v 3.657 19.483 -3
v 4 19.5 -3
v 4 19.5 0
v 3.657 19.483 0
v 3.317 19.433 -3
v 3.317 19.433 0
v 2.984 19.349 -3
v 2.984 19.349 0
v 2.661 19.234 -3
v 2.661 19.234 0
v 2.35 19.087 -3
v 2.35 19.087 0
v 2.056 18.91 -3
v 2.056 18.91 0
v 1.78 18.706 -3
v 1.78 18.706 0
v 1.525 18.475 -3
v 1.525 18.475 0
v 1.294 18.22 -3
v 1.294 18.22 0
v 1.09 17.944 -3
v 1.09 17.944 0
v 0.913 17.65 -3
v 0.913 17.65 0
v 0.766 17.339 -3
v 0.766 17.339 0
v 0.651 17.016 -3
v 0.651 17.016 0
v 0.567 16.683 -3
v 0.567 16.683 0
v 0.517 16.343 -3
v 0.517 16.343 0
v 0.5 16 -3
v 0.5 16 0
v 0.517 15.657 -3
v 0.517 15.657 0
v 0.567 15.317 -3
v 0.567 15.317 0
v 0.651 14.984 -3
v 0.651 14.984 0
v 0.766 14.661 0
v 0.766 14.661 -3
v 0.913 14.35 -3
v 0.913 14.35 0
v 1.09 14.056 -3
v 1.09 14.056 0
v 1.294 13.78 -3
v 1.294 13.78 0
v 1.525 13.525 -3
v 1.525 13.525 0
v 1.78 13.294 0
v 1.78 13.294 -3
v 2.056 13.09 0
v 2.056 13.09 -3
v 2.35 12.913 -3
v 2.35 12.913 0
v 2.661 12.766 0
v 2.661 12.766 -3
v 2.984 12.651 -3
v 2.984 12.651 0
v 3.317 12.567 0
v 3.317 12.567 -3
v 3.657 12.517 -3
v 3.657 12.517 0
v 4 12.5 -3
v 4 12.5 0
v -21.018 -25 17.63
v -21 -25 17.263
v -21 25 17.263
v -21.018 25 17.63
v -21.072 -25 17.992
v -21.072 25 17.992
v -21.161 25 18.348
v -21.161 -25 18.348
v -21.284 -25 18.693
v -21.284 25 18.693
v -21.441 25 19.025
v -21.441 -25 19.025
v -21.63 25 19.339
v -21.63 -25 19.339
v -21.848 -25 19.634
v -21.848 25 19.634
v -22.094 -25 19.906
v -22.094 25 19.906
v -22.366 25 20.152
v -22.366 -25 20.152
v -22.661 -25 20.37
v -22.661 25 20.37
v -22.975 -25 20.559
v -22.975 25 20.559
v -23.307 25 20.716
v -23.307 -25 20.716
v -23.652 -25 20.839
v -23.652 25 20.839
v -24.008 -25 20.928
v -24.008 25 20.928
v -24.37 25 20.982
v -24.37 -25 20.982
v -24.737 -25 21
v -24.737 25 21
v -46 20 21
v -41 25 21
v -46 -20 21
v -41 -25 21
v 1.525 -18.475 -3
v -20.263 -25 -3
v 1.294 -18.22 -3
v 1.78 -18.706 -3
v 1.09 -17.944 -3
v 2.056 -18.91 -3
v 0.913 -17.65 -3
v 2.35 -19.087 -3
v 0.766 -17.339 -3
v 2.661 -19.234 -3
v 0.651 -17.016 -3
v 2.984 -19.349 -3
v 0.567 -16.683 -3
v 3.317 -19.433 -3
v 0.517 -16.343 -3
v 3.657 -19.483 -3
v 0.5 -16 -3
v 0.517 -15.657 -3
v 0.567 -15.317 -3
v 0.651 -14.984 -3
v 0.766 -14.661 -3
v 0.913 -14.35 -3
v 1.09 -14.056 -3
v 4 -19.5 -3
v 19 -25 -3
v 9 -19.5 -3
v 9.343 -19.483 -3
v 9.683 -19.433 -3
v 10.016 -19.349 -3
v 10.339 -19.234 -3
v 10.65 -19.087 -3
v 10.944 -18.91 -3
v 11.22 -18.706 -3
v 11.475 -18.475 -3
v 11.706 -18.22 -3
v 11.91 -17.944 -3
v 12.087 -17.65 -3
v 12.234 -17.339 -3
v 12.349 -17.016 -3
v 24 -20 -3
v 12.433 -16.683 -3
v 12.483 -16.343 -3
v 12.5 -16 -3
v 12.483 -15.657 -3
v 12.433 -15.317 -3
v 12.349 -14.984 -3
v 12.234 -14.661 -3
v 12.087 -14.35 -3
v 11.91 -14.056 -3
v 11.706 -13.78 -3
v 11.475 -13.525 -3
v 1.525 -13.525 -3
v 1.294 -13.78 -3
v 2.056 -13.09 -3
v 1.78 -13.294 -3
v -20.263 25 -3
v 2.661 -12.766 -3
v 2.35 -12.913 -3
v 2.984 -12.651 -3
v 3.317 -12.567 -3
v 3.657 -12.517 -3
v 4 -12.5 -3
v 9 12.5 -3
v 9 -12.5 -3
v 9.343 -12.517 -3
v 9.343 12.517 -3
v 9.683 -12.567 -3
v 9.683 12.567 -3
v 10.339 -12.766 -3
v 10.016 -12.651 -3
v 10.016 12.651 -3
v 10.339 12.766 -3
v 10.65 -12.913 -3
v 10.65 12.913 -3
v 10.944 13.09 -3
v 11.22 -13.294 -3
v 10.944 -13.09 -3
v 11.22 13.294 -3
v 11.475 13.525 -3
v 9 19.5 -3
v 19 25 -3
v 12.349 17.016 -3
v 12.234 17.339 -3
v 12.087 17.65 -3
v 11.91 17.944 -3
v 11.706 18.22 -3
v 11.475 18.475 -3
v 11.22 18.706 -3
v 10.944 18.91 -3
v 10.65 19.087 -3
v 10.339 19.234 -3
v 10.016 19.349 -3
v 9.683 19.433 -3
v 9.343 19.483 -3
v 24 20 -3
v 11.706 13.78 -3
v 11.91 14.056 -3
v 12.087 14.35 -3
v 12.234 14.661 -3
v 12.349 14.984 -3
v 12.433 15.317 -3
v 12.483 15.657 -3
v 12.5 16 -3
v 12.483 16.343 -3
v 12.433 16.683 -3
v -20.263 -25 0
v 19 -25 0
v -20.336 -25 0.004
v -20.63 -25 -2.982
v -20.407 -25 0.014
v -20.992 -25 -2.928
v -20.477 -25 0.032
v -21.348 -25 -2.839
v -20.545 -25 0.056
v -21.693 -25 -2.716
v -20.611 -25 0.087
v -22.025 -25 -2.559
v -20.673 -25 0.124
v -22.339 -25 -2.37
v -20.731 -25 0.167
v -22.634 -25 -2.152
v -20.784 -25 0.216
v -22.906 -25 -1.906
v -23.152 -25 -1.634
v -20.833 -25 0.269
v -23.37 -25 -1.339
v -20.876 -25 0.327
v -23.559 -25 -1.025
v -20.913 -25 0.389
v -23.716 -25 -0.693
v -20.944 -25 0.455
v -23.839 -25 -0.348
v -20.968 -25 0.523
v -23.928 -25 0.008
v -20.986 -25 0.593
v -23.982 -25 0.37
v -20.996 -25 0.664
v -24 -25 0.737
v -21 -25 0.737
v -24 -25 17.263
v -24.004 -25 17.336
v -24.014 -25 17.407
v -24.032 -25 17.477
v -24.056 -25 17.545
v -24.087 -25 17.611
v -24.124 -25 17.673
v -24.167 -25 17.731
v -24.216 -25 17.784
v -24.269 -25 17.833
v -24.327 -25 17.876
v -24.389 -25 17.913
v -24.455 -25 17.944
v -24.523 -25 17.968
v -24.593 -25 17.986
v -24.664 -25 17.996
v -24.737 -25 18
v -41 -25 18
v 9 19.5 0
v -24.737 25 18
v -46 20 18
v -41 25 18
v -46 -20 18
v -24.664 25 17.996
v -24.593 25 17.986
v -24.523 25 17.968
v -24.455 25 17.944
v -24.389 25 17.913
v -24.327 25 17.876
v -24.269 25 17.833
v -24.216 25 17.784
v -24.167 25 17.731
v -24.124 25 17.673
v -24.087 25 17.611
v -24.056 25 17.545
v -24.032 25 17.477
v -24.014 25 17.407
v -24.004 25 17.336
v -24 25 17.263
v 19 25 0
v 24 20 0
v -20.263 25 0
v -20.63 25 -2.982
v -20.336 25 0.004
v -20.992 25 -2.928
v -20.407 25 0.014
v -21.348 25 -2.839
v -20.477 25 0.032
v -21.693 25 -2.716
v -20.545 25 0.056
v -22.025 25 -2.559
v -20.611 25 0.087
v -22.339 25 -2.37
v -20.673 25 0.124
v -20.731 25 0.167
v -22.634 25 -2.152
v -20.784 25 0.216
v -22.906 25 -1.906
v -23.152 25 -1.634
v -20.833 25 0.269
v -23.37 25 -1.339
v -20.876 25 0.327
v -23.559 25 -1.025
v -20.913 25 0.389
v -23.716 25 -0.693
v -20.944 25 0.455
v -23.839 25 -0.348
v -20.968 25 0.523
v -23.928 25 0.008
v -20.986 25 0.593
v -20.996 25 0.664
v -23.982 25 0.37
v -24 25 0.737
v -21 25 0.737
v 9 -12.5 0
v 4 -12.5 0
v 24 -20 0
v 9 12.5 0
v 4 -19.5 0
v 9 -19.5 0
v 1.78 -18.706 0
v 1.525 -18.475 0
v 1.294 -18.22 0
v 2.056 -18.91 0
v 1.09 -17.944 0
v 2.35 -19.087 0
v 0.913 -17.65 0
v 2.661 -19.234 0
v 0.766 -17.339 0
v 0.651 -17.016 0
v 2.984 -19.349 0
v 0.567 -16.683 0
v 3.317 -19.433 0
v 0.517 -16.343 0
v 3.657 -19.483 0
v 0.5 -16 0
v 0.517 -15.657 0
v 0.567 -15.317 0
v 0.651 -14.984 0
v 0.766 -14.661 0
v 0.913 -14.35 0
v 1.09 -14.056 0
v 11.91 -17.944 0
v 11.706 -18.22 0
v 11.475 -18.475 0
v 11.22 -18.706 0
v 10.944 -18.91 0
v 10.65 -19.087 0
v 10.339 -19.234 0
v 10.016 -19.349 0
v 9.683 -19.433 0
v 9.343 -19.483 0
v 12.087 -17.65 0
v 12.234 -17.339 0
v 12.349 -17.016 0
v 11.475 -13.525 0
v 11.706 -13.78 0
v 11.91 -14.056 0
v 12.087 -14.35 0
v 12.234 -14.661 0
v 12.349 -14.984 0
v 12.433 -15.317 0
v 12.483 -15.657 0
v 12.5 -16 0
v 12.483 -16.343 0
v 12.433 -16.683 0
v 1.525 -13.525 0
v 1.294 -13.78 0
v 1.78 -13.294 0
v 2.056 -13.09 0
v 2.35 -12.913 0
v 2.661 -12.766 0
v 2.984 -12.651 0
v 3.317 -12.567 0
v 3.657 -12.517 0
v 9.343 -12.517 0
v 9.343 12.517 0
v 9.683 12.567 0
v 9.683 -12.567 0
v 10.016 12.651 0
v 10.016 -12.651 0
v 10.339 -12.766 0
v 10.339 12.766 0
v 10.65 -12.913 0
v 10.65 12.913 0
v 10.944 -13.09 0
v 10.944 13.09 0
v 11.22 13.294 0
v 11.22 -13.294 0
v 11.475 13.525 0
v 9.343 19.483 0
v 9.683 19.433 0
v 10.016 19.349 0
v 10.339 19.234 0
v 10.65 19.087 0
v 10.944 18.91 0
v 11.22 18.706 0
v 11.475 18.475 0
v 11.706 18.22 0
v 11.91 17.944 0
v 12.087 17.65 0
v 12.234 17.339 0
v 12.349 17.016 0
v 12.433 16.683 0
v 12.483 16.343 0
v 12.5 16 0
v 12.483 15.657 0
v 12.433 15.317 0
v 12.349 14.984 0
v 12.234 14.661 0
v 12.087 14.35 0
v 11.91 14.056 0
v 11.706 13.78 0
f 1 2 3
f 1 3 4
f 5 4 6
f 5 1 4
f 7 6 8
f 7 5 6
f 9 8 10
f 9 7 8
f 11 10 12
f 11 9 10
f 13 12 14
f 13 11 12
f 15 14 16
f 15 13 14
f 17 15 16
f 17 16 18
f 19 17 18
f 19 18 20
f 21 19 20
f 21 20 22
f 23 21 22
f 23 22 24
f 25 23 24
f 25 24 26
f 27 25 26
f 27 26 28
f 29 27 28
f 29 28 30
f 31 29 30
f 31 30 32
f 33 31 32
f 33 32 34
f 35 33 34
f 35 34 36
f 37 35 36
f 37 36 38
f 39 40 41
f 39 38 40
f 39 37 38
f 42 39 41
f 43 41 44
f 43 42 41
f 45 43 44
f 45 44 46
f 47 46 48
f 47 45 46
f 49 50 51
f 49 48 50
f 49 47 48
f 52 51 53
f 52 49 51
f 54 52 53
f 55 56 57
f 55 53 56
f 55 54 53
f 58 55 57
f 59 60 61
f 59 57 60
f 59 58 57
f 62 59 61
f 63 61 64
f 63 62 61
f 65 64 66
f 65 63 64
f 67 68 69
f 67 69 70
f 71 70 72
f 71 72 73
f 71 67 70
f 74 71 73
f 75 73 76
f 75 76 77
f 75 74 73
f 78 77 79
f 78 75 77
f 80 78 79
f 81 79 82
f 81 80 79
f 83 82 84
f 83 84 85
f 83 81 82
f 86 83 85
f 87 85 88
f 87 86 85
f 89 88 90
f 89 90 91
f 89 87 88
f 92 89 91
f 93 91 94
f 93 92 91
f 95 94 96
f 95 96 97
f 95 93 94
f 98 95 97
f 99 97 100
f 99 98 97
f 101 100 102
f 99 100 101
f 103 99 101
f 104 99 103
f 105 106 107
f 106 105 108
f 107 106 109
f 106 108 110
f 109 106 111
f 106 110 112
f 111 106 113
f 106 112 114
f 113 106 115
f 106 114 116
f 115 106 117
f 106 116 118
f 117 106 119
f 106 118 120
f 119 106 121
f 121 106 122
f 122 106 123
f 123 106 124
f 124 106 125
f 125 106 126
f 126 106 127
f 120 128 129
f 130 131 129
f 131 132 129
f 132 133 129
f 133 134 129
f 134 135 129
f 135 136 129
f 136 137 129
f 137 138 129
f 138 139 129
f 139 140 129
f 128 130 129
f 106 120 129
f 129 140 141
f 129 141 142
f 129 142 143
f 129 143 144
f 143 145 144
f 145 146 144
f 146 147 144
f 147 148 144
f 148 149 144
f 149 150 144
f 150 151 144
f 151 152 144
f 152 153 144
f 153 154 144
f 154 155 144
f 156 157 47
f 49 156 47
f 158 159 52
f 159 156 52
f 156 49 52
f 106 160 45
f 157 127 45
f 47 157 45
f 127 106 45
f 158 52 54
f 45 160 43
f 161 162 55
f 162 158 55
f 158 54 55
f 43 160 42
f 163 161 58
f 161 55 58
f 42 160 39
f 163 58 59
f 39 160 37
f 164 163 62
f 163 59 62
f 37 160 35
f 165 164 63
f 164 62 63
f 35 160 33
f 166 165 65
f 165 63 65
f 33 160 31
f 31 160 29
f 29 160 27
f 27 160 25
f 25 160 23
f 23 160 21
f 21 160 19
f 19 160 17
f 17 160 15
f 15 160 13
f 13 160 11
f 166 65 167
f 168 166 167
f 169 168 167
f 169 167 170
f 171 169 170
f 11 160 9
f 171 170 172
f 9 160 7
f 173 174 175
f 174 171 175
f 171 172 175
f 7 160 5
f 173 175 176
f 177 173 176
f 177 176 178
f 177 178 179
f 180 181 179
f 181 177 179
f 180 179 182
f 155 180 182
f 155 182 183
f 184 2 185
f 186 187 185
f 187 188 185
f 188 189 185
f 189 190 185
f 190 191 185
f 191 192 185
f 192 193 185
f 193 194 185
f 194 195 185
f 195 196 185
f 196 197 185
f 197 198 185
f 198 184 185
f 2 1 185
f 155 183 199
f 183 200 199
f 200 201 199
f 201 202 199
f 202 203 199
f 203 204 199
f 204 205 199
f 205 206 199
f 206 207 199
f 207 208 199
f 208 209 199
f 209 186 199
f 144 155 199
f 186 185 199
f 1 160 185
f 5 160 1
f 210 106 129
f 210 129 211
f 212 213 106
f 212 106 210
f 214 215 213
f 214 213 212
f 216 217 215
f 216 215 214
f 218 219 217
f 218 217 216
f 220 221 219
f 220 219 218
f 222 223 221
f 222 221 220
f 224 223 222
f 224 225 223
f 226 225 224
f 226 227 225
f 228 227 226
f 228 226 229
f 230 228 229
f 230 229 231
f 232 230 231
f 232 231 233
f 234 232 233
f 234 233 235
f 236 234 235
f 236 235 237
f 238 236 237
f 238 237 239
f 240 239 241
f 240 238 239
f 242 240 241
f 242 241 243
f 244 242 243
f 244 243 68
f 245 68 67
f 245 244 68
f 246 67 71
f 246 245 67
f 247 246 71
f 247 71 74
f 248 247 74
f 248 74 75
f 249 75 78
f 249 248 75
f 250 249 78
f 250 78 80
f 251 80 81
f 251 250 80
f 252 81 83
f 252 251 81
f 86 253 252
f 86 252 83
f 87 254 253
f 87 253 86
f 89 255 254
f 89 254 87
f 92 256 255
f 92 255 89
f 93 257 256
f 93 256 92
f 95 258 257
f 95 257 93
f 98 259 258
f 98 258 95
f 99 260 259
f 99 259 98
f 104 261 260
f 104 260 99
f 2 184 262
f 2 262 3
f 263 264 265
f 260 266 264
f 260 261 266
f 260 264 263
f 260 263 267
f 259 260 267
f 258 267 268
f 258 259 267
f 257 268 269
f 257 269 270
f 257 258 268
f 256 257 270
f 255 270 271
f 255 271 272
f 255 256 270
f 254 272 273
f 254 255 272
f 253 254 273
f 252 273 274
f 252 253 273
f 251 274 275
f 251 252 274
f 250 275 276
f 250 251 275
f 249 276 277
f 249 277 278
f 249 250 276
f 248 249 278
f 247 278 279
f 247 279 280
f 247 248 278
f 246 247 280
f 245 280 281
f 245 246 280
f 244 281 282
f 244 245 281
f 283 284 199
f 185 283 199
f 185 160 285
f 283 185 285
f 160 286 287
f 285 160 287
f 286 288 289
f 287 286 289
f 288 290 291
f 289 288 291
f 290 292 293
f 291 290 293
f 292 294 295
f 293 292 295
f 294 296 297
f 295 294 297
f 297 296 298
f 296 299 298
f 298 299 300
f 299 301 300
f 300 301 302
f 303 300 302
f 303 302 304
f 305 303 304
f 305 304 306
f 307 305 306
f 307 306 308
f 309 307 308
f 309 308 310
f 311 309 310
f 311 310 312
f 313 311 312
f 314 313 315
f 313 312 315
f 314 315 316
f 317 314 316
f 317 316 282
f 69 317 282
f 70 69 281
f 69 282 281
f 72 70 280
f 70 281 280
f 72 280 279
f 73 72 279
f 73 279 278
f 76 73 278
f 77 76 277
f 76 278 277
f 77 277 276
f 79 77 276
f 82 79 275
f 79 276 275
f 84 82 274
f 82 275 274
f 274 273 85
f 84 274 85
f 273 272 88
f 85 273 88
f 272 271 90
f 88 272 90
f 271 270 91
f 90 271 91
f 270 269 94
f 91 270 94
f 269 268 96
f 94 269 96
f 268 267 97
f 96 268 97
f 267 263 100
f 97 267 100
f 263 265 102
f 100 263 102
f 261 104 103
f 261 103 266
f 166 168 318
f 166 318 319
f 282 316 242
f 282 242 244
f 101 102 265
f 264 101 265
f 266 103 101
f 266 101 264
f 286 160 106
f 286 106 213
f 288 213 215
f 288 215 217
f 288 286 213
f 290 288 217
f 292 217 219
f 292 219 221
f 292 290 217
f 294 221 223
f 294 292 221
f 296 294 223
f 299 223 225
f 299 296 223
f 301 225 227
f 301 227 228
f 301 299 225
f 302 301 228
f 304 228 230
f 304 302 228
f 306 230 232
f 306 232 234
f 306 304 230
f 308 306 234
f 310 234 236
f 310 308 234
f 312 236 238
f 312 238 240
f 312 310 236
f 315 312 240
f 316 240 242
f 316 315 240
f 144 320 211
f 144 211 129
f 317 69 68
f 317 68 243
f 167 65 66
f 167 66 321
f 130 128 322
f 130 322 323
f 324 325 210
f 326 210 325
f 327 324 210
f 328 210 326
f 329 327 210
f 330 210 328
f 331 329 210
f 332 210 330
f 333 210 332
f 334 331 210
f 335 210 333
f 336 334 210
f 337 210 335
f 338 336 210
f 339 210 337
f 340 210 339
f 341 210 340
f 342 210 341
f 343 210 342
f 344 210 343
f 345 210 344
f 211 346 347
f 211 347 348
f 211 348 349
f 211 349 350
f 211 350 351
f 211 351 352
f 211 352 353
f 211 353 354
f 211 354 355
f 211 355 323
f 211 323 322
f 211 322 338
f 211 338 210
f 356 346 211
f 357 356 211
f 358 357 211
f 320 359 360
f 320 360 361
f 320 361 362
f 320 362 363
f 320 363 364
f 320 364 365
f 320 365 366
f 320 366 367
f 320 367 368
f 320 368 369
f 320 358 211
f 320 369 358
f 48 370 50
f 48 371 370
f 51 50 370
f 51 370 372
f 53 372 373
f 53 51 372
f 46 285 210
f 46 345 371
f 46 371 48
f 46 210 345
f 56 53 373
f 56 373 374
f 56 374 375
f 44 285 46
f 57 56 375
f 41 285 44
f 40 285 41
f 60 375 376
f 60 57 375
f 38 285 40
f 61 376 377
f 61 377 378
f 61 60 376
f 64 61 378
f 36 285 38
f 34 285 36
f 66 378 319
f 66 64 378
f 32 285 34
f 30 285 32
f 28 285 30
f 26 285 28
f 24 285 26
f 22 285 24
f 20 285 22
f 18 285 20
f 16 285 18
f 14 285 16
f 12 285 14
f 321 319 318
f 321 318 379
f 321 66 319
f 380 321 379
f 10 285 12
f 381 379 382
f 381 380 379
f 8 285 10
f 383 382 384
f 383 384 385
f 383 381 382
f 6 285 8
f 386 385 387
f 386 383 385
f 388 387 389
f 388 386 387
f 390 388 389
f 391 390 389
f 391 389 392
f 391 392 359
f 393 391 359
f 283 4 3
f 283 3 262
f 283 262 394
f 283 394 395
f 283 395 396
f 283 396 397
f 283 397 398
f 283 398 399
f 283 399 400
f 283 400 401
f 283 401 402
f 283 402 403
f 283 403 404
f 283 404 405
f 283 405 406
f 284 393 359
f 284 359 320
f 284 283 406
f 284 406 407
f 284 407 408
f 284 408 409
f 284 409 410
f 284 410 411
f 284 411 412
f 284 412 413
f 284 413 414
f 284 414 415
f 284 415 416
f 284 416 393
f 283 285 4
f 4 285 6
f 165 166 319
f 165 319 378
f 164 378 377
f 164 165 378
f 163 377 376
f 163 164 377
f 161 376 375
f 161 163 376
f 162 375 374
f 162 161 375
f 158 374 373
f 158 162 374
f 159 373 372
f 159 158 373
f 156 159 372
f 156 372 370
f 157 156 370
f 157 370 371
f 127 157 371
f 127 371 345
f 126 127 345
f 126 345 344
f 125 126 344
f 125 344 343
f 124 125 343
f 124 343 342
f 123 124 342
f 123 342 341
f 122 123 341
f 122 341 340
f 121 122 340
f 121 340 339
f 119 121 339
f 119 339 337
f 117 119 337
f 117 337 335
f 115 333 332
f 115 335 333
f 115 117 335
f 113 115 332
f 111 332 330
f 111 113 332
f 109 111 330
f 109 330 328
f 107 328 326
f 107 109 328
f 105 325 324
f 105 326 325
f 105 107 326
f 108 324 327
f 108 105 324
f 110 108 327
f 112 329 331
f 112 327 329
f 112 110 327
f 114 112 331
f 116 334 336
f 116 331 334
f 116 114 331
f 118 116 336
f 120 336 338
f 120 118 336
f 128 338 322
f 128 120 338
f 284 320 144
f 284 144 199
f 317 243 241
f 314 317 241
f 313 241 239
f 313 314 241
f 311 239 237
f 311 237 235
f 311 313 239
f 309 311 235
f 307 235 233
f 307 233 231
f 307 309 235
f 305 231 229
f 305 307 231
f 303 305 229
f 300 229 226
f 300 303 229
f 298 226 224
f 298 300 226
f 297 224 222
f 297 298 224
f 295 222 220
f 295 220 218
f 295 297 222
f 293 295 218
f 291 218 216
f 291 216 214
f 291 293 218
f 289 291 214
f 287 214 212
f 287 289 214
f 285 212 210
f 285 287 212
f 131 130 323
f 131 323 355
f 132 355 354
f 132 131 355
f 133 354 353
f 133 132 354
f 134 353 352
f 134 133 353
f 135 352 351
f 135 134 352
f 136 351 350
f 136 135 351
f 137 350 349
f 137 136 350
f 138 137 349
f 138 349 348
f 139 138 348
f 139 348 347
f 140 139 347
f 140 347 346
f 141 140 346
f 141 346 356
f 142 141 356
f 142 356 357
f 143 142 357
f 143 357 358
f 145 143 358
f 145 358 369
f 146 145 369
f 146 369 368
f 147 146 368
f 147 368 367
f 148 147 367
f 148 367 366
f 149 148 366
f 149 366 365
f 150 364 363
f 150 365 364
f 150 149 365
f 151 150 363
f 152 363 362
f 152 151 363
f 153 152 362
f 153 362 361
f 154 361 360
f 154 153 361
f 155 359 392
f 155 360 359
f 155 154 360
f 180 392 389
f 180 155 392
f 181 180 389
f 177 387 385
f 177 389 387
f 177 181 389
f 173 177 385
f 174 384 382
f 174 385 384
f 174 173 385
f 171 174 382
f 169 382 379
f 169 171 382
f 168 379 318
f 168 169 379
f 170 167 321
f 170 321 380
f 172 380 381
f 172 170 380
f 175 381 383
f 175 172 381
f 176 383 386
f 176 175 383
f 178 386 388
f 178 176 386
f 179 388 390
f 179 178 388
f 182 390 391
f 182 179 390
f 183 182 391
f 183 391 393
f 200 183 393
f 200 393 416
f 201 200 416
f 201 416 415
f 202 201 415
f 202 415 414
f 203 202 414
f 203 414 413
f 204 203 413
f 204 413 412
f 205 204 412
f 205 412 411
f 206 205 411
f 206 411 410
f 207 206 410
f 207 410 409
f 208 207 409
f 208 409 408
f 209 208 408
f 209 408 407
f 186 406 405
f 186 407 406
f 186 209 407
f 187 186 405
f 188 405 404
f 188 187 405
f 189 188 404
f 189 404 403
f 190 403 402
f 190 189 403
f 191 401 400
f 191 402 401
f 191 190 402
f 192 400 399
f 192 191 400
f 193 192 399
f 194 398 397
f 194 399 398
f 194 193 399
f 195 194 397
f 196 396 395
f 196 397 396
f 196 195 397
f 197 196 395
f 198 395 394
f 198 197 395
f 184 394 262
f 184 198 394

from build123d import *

# Parameters (mm, degrees)
SKETCH_1_W                       = 48
SKETCH_1_H                       = 50
SM_BASE_FLANGE_1_DEPTH           = 3
SM_EDGE_FLANGE_1_STRIP_W         = 13.4732
SM_EDGE_FLANGE_1_STRIP_H         = 3
SM_EDGE_FLANGE_1_STRIP_CUT_DEPTH = 50
SM_EDGE_FLANGE_1_DEPTH           = 50
SM_EDGE_FLANGE_2_STRIP_W         = 13.4732
SM_EDGE_FLANGE_2_STRIP_H         = 3
SM_EDGE_FLANGE_2_STRIP_CUT_DEPTH = 50
SM_EDGE_FLANGE_2_DEPTH           = 50
CHAMFER_1_SIZE                   = 5
HOLE_WIZARD_7_0_7_1_D            = 7
CUT_EXTRUDE_1_DEPTH              = 10


# Sheet-metal steps are written as plain solids
with BuildPart() as part:
    # Sketch 1 → 基体-法兰1 (new body)
    with BuildSketch(Plane.XY):
        Rectangle(SKETCH_1_W, SKETCH_1_H)
    extrude(amount=-SM_BASE_FLANGE_1_DEPTH)

    # 边线-法兰1 strip (across the edge) → 边线-法兰1 strip cut (cut)
    with BuildSketch(Plane(origin=(-24, 25, 0), x_dir=(1, 0, 0), z_dir=(0, -1, 0))):
        with Locations((-3, -1.5)):
            Rectangle(SM_EDGE_FLANGE_1_STRIP_W, SM_EDGE_FLANGE_1_STRIP_H)
    extrude(amount=SM_EDGE_FLANGE_1_STRIP_CUT_DEPTH, mode=Mode.SUBTRACT)

    # 边线-法兰1 section (across the edge) → 边线-法兰1 (add)
    with BuildSketch(Plane(origin=(-24, 25, 0), x_dir=(1, 0, 0), z_dir=(0, -1, 0))):
        with BuildLine():
            Line((0, 0.7366), (0, 21))
            Line((0, 21), (3, 21))
            Line((3, 21), (3, 0.7366))
            ThreePointArc((3, 0.7366), (3.215745145, 0.215745145), (3.7366, 0))
            Line((3.7366, 0), (3.7366, -3))
            ThreePointArc((3.7366, -3), (1.094424801, -1.905575199), (0, 0.7366))
        make_face()
    extrude(amount=SM_EDGE_FLANGE_1_DEPTH)

    # 边线-法兰2 strip (across the edge) → 边线-法兰2 strip cut (cut)
    with BuildSketch(Plane(origin=(-24, -25, 21), x_dir=(0, 0, -1), z_dir=(0, 1, 0))):
        with Locations((-3, -1.5)):
            Rectangle(SM_EDGE_FLANGE_2_STRIP_W, SM_EDGE_FLANGE_2_STRIP_H)
    extrude(amount=SM_EDGE_FLANGE_2_STRIP_CUT_DEPTH, mode=Mode.SUBTRACT)

    # 边线-法兰2 section (across the edge) → 边线-法兰2 (add)
    with BuildSketch(Plane(origin=(-24, -25, 21), x_dir=(0, 0, -1), z_dir=(0, 1, 0))):
        with BuildLine():
            Line((0, 0.7366), (0, 22))
            Line((0, 22), (3, 22))
            Line((3, 22), (3, 0.7366))
            ThreePointArc((3, 0.7366), (3.215745145, 0.215745145), (3.7366, 0))
            Line((3.7366, 0), (3.7366, -3))
            ThreePointArc((3.7366, -3), (1.094424801, -1.905575199), (0, 0.7366))
        make_face()
    extrude(amount=SM_EDGE_FLANGE_2_DEPTH)

    # 倒角1
    chamfer_1_edges = [part.edges().sort_by_distance(p)[0] for p in [
        (-46, -25, 19.5),
        (-46, 25, 19.5),
        (24, 25, -1.5),
        (24, -25, -1.5),
    ]]
    chamfer(chamfer_1_edges, length=CHAMFER_1_SIZE)

    # Ø7.0 (7) 直径孔1 (through all)
    with Locations(Plane(origin=(0, 0, -3), x_dir=(-1, 0, 0), z_dir=(0, 0, -1))):
        with Locations((-6.5, 16), (-6.5, -16)):
            Hole(HOLE_WIZARD_7_0_7_1_D / 2)

    # 草图14 → 切除-拉伸1 (cut)
    with BuildSketch(Plane(origin=(0, 0, -3), x_dir=(-1, 0, 0), z_dir=(0, 0, -1))):
        with BuildLine():
            Line((-9, 19.5), (-4, 19.5))
            ThreePointArc((-4, 19.5), (-0.5, 16), (-4, 12.5))
            Line((-4, 12.5), (-9, 12.5))
            ThreePointArc((-9, 12.5), (-12.5, 16), (-9, 19.5))
        make_face()
        with BuildLine():
            Line((-9, -12.5), (-4, -12.5))
            ThreePointArc((-4, -12.5), (-0.5, -16), (-4, -19.5))
            Line((-4, -19.5), (-9, -19.5))
            ThreePointArc((-9, -19.5), (-12.5, -16), (-9, -12.5))
        make_face()
    extrude(amount=-CUT_EXTRUDE_1_DEPTH, mode=Mode.SUBTRACT)


solid = part.part
